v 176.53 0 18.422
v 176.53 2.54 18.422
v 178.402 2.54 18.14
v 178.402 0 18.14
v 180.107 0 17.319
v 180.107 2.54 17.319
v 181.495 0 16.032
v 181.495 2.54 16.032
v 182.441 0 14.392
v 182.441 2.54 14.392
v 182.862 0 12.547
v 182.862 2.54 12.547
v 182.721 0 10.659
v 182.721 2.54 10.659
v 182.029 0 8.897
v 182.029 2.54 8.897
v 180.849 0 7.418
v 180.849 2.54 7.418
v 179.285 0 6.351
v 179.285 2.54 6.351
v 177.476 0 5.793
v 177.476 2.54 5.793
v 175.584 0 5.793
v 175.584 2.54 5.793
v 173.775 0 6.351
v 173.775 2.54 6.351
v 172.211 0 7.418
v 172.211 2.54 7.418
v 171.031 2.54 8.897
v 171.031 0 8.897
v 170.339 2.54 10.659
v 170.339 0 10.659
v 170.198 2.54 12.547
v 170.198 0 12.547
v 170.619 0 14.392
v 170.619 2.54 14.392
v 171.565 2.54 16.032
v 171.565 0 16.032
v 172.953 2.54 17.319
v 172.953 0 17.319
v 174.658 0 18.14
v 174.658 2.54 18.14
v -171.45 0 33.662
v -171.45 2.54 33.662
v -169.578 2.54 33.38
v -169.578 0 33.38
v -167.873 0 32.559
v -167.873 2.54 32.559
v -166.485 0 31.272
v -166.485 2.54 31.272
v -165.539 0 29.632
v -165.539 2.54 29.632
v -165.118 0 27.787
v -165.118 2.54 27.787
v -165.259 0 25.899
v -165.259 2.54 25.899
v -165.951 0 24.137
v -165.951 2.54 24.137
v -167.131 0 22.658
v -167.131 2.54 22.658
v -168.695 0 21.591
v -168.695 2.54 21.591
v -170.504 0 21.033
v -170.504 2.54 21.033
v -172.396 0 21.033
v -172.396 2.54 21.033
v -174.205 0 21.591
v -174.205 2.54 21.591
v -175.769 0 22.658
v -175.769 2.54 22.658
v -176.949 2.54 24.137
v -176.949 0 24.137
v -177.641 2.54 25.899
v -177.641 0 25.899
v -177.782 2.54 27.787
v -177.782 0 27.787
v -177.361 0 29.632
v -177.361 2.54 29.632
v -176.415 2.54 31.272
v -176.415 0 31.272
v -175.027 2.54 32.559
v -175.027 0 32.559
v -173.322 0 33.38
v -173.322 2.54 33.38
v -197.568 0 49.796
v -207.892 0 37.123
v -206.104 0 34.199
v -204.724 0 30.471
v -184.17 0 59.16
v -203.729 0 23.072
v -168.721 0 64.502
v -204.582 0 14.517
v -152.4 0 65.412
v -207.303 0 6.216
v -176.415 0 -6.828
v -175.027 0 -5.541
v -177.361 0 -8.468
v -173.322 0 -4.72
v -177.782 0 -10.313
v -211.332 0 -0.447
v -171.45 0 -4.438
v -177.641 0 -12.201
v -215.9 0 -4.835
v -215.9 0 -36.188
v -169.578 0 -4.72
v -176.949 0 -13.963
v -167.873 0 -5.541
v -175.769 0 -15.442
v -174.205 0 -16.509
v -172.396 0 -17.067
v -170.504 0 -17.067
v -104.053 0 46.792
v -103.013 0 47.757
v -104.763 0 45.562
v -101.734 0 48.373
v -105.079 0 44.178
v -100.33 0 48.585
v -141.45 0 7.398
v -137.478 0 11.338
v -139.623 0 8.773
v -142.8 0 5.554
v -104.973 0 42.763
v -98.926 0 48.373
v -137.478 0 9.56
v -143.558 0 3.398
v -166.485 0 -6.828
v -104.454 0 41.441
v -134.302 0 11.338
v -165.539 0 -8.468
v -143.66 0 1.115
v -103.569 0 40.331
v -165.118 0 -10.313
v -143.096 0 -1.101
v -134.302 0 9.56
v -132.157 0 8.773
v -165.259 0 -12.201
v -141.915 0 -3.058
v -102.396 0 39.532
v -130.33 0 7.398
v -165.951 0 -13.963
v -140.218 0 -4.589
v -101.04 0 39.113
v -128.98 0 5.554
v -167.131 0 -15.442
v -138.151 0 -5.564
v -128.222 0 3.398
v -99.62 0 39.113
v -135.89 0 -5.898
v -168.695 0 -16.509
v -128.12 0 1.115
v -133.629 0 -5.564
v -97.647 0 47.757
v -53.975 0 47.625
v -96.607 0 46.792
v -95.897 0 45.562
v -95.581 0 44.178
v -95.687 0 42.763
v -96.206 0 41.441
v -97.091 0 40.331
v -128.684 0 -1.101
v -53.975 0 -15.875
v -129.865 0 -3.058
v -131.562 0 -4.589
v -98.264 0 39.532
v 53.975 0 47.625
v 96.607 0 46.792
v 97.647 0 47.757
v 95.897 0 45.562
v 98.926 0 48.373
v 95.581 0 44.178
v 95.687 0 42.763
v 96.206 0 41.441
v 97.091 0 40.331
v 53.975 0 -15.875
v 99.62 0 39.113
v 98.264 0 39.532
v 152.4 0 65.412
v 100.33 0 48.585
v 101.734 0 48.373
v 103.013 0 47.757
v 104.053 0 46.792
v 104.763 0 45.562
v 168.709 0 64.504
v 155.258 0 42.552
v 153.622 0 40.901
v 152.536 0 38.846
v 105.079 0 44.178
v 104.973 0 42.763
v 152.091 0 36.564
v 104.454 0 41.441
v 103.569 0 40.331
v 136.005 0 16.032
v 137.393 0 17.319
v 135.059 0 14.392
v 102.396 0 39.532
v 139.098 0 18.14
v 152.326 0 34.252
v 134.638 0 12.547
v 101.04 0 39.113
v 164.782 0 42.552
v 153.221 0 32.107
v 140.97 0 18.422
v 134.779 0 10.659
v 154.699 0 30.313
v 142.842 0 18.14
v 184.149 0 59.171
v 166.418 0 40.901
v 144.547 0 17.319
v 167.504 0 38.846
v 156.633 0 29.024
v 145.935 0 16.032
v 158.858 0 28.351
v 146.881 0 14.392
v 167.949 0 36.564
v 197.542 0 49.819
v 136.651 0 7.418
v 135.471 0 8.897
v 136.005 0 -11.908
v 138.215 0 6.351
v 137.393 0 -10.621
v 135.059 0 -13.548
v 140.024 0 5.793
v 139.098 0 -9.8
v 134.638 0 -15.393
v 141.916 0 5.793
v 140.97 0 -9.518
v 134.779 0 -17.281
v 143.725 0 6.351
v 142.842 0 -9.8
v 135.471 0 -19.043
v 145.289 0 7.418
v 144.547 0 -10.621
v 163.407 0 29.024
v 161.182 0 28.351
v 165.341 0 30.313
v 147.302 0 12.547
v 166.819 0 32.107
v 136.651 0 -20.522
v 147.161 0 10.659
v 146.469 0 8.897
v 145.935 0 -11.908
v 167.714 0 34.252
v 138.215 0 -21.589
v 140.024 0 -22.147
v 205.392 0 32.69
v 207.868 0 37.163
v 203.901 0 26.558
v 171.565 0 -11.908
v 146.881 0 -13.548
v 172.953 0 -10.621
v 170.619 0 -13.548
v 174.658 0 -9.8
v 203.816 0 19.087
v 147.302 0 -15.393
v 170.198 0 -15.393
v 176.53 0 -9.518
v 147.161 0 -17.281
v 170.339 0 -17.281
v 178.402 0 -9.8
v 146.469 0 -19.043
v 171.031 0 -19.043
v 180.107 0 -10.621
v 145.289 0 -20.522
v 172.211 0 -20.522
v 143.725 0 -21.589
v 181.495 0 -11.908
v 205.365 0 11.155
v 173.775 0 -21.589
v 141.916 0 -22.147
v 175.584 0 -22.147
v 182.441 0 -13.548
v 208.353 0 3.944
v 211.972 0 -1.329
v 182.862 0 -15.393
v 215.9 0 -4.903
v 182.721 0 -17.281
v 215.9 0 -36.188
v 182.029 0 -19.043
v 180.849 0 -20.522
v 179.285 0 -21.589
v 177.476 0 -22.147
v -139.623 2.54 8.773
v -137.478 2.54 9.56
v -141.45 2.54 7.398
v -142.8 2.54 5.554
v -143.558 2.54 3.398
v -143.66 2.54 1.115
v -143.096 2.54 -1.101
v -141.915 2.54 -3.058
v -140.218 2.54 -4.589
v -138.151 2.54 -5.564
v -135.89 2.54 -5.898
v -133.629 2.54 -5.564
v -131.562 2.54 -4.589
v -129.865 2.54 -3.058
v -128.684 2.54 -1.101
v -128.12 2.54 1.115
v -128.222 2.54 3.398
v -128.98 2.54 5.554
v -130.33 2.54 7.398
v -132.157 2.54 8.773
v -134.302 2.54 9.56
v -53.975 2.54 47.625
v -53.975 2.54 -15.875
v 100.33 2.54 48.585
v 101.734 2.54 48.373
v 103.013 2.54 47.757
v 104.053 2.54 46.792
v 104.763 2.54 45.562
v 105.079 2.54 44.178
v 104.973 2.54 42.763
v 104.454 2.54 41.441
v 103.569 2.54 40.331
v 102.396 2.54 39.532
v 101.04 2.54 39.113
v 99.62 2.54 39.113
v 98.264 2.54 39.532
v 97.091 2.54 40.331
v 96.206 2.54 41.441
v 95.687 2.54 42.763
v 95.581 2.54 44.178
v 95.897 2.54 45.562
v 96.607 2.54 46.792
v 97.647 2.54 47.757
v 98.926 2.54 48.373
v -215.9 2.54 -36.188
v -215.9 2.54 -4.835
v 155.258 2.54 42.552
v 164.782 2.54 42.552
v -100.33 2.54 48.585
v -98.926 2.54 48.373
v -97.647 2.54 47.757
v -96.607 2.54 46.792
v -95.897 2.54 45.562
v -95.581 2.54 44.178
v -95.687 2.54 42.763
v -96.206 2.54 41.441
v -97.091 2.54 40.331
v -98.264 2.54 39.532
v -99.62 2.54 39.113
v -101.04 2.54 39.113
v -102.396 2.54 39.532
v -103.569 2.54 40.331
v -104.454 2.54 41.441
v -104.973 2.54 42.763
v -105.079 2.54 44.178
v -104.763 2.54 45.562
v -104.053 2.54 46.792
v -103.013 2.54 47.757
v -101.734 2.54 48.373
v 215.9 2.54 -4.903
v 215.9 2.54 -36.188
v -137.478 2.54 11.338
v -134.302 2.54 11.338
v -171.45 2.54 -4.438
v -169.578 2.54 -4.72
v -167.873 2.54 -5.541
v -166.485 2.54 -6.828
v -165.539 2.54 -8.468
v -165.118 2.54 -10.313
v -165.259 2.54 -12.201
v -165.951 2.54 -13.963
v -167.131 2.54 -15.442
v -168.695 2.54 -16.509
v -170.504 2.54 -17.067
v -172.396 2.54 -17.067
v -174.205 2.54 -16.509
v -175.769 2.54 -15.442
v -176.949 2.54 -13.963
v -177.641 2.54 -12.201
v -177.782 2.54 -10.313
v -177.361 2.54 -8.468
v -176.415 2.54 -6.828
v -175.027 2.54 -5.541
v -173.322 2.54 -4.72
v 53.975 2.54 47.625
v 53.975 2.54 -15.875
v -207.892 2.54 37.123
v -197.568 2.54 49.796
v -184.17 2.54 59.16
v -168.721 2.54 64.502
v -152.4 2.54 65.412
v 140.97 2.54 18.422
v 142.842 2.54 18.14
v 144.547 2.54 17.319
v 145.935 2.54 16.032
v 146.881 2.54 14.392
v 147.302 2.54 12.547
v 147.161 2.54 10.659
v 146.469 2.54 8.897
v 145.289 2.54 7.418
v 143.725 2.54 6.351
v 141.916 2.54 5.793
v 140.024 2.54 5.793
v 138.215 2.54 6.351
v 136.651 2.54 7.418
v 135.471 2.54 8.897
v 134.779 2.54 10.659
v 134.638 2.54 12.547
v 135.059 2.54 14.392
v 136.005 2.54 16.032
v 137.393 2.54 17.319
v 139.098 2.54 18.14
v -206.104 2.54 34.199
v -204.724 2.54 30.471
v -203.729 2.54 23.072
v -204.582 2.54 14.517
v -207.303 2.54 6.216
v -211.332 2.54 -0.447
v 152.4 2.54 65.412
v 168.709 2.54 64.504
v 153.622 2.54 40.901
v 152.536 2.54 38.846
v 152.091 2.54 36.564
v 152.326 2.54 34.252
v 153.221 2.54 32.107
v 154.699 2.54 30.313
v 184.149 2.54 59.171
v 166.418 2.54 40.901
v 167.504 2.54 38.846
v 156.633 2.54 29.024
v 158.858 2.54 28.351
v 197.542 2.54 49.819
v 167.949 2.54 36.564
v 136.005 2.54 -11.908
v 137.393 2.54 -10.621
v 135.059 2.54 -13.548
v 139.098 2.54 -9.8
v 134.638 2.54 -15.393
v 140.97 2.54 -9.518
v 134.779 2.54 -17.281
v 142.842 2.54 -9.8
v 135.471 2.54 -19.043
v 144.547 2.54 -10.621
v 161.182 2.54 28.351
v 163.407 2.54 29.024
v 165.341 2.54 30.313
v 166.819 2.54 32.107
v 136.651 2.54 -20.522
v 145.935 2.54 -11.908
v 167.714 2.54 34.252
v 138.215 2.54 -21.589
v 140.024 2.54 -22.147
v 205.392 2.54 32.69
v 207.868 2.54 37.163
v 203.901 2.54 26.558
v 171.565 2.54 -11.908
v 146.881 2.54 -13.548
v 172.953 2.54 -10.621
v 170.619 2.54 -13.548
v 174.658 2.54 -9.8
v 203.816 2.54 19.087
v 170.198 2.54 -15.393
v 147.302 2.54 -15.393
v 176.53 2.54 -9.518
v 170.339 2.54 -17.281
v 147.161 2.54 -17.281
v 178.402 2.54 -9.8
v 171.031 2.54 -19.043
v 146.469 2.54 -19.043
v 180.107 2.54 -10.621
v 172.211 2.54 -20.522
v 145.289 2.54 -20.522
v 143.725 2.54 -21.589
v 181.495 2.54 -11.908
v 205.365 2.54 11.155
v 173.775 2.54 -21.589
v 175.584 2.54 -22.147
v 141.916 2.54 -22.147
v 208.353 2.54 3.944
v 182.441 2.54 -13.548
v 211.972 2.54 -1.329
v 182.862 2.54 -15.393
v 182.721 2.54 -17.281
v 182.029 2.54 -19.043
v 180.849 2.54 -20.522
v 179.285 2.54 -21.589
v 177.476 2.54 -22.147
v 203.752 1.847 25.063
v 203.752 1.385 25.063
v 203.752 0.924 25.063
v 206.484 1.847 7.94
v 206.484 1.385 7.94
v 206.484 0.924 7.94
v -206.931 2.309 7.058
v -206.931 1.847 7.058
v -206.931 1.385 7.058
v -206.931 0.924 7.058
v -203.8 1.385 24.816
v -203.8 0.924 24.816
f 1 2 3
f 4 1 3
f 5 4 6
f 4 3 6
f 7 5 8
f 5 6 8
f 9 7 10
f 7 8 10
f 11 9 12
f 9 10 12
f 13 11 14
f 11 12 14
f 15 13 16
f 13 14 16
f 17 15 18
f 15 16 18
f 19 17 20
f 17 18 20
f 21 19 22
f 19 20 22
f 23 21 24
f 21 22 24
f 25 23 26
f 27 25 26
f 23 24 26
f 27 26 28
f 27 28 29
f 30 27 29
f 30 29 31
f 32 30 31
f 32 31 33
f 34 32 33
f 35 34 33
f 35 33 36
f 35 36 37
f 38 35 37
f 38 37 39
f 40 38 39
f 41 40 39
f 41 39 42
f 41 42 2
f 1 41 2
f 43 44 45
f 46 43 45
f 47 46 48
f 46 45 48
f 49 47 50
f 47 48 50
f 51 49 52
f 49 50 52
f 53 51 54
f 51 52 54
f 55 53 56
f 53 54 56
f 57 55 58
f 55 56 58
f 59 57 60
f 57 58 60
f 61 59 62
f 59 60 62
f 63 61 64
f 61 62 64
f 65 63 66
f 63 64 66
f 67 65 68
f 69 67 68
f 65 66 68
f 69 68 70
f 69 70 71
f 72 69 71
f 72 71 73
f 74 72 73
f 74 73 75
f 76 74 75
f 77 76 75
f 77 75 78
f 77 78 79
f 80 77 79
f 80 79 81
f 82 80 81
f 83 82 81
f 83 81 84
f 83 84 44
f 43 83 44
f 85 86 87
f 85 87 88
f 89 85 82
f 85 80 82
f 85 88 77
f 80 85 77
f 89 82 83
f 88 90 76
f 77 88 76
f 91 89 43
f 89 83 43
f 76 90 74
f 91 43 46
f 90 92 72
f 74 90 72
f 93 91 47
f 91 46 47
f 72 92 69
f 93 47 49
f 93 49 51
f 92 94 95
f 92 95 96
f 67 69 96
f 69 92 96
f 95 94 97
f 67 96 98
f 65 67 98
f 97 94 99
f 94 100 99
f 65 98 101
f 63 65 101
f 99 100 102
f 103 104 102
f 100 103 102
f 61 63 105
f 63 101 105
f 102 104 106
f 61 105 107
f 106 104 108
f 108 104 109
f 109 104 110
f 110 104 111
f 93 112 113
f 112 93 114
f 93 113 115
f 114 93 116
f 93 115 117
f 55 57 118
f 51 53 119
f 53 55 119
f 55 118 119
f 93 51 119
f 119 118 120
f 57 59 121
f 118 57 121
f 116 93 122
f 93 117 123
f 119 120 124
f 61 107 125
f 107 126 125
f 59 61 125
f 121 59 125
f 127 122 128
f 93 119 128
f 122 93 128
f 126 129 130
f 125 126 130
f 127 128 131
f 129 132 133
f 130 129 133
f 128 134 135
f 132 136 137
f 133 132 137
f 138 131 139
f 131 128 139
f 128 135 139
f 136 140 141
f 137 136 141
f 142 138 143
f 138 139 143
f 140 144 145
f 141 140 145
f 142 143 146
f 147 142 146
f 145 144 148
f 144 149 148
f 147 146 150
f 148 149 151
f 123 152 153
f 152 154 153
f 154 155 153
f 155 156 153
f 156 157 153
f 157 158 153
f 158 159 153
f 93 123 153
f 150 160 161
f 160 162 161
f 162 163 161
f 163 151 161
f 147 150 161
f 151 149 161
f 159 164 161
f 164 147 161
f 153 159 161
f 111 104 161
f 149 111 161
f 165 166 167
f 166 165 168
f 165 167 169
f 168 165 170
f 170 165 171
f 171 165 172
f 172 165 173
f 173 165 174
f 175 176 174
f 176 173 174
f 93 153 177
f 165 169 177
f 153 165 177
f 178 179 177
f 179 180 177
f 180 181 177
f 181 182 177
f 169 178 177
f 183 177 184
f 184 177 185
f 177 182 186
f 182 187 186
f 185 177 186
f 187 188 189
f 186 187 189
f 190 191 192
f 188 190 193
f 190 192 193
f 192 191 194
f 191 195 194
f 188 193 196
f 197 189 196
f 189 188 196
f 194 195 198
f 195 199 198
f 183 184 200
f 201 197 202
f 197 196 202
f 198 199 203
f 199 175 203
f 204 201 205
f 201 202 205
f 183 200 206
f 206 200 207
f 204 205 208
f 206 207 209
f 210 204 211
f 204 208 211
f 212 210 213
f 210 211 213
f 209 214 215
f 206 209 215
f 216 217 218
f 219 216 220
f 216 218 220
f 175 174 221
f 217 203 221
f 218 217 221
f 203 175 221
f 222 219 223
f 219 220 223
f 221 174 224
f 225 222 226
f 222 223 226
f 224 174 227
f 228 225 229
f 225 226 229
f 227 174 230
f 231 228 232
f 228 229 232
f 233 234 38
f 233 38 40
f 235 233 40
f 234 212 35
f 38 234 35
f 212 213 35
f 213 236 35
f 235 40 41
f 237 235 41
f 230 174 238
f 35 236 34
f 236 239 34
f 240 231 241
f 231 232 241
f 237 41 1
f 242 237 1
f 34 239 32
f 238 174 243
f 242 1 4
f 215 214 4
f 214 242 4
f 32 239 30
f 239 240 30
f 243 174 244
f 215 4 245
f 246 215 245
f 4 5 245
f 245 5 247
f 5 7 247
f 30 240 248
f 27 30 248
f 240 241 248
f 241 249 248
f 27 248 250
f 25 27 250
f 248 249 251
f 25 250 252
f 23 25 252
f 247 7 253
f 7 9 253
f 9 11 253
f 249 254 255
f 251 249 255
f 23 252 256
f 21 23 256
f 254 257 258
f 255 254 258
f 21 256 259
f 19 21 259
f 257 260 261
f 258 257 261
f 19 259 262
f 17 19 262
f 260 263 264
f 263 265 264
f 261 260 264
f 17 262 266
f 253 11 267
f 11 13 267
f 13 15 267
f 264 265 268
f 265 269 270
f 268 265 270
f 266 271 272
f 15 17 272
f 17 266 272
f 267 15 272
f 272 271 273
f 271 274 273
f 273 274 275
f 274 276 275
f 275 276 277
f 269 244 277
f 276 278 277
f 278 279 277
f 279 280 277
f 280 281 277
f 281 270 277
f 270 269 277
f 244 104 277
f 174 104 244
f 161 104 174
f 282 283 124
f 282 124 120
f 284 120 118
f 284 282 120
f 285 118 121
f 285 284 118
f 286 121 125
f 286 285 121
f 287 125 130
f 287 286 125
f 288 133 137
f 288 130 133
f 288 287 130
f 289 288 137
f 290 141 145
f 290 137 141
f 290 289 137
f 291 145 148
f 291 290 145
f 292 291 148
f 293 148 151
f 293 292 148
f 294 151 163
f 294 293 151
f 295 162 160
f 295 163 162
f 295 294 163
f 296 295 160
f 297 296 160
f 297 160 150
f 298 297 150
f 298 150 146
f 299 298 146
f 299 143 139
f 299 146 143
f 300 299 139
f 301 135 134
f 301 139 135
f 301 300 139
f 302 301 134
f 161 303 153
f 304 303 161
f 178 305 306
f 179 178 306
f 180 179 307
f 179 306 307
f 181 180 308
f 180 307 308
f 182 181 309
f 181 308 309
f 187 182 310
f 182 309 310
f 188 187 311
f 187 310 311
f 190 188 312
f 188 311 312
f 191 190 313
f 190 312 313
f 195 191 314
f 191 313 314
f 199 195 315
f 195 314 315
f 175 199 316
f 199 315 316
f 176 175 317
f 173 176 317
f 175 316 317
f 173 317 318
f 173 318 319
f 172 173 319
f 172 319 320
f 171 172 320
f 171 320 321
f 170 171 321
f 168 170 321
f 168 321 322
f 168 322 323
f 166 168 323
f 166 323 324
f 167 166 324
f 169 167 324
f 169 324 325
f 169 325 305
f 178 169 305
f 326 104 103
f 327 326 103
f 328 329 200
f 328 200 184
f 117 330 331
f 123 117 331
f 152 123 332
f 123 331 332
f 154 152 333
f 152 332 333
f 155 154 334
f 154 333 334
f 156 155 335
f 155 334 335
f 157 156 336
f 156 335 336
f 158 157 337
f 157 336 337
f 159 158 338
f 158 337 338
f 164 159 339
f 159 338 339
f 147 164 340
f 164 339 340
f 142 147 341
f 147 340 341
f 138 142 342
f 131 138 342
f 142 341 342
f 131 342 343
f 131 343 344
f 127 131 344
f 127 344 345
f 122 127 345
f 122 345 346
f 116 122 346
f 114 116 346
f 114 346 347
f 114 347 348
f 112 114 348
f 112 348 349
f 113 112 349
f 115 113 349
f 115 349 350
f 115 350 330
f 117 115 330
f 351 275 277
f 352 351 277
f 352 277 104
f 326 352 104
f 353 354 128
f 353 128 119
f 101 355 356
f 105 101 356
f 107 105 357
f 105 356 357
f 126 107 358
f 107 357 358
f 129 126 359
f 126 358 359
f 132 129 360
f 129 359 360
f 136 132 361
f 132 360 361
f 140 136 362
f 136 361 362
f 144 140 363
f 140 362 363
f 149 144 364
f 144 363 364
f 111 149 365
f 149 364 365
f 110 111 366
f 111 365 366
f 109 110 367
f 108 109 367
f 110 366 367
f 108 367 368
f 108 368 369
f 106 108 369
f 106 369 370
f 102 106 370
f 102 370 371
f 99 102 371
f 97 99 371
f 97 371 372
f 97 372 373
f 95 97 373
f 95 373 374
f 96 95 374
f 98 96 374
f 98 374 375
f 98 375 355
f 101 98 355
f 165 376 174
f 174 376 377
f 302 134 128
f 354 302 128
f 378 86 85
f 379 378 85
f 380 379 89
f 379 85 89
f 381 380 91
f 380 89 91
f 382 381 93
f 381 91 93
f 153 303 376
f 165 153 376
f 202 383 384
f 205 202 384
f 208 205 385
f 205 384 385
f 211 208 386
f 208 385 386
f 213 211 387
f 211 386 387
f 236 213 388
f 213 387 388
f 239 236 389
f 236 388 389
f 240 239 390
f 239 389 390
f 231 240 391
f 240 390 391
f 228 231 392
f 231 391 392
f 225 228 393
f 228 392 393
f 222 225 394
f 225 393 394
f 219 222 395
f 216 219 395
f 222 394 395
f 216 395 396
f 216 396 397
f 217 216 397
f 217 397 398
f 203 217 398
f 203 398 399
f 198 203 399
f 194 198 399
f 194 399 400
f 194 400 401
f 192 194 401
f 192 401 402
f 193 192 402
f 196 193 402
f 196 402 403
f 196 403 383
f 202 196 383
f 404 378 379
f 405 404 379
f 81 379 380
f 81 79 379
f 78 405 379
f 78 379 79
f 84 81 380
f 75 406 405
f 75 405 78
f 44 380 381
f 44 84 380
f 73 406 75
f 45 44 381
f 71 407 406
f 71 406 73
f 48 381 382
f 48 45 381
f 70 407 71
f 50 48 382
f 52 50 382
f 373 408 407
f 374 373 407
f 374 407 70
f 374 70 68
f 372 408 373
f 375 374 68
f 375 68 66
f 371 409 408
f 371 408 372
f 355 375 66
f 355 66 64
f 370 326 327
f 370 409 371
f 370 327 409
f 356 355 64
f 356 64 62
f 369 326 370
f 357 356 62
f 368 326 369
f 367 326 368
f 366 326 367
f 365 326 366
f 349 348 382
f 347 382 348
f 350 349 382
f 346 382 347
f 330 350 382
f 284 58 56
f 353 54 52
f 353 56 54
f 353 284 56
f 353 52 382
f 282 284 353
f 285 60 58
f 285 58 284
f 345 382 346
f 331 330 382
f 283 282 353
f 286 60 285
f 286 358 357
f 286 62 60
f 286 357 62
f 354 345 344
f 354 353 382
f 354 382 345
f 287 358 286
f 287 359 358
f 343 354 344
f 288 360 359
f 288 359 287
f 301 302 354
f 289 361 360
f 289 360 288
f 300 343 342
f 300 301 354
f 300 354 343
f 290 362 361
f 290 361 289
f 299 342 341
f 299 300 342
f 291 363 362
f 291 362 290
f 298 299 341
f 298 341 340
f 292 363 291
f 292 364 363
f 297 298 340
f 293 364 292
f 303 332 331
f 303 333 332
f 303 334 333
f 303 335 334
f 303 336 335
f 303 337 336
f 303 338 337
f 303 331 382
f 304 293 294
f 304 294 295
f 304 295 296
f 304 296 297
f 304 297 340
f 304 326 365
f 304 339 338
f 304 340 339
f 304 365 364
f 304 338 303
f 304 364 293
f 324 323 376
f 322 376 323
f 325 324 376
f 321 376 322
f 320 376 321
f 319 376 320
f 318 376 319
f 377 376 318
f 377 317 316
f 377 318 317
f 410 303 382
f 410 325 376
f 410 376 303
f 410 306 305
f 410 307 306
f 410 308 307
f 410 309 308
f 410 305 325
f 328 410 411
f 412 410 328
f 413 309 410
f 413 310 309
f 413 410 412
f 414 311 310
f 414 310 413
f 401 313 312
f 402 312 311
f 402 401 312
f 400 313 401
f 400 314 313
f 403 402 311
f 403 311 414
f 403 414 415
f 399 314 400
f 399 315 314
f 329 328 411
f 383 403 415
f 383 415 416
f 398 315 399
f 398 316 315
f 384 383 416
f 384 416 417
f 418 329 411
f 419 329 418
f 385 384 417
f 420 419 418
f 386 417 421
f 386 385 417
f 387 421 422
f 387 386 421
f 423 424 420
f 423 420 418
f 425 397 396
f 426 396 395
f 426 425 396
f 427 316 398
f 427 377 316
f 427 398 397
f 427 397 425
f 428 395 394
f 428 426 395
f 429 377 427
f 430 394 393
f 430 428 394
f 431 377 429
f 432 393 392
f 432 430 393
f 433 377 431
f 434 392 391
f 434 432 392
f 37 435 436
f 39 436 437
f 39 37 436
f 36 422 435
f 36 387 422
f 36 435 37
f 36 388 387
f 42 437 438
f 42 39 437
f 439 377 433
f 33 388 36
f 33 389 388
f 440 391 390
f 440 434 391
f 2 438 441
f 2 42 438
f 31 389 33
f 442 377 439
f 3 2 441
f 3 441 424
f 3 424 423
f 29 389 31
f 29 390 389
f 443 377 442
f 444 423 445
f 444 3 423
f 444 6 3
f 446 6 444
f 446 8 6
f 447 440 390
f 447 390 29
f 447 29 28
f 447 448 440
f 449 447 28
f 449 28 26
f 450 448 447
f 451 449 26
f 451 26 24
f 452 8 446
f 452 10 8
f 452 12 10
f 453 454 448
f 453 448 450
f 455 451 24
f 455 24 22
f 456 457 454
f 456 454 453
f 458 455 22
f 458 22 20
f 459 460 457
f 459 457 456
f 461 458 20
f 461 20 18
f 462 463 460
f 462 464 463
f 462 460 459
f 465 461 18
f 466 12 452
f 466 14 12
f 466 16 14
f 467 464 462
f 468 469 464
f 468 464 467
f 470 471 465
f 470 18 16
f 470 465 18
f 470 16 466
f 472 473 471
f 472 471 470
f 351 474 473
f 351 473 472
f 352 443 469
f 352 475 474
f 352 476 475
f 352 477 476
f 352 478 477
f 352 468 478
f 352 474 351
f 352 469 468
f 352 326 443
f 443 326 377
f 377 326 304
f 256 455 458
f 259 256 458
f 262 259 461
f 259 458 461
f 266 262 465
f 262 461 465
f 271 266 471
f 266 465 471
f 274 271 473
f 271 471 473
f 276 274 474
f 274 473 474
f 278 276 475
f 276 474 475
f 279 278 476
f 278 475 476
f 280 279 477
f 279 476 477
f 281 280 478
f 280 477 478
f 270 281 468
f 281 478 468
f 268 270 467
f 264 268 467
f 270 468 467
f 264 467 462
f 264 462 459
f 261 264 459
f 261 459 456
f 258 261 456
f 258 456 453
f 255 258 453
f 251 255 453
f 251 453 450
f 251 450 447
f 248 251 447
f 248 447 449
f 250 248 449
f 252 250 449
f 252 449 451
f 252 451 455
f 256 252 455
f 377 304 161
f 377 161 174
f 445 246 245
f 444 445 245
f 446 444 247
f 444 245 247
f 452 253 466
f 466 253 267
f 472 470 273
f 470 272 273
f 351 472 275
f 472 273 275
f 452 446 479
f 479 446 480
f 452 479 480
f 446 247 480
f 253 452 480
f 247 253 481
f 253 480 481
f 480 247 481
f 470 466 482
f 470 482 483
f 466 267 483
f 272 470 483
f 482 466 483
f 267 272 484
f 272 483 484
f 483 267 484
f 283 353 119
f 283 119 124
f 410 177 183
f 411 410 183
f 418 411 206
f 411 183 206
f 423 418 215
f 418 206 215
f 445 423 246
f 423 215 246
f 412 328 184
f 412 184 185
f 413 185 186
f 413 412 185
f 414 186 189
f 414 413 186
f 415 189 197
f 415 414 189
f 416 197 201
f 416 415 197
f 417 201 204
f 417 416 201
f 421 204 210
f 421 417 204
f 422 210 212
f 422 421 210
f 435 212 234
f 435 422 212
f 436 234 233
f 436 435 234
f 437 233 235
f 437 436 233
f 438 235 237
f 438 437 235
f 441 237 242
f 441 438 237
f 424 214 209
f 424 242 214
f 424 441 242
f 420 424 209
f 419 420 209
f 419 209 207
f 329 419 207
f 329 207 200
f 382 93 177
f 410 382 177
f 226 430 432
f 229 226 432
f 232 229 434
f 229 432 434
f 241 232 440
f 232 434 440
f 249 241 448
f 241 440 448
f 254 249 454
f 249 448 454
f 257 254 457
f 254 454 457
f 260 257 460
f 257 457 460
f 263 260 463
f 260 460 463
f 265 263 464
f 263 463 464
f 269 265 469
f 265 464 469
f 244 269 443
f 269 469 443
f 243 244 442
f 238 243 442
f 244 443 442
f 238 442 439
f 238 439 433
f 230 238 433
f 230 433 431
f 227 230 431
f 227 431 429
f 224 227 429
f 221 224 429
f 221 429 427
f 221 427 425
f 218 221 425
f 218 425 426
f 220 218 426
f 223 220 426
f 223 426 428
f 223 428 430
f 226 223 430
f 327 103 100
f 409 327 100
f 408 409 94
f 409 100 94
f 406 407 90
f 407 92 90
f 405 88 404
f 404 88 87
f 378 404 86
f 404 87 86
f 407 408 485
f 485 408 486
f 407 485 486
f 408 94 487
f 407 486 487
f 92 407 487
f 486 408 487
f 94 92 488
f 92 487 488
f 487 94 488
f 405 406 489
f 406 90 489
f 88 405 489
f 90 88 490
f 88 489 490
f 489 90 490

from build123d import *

# Parameters (mm, degrees)
BOSS_EXTRUDE1_DEPTH = 2.54
SKETCH2_W           = 107.95
SKETCH2_H           = 63.5
CUT_EXTRUDE1_DEPTH  = 226.664855764
CUT_EXTRUDE2_START  = -2.54
CUT_EXTRUDE2_DEPTH  = 2.54
SKETCH4_R           = 4.7625
SKETCH4_R_2         = 6.35
CUT_EXTRUDE3_DEPTH  = 226.66485589


# Read off the part's stored shape, not the designer's step: Cut-Extrude2
with BuildPart() as part:
    # Sketch1 → Boss-Extrude1 (new body)
    with BuildSketch(Plane(origin=(0, 0, 0), x_dir=(1, 0, 0), z_dir=(0, 1, 0))):
        with BuildLine():
            Line((215.9, -14.612459999), (215.9, 36.187540001))
            Line((215.9, 36.187540001), (-215.9, 36.187540001))
            Line((-215.9, 36.187540001), (-215.9, -14.612459999))
            ThreePointArc((-215.9, -14.612459999), (-194.259204241, -52.648965299), (-152.4, -65.412459999))
            Line((-152.4, -65.412459999), (152.4, -65.412459999))
            ThreePointArc((152.4, -65.412459999), (194.259204241, -52.648965299), (215.9, -14.612459999))
        make_face()
    extrude(amount=BOSS_EXTRUDE1_DEPTH)

    # Sketch2 → Cut-Extrude1 (cut, through all)
    with BuildSketch(Plane(origin=(0, 2.54, 0), x_dir=(1, 0, 0), z_dir=(0, 1, 0))):
        with Locations((0, -15.875)):
            Rectangle(SKETCH2_W, SKETCH2_H)
    extrude(amount=-CUT_EXTRUDE1_DEPTH, mode=Mode.SUBTRACT)

    # Cut-Extrude2 outline → Cut-Extrude2 (cut)
    with BuildSketch(Plane(origin=(0, 2.54, 0), x_dir=(1, 0, 0), z_dir=(0, 1, 0)).offset(CUT_EXTRUDE2_START)):
        with BuildLine():
            add(Edge.make_bspline(
                [(-215.899999994, 4.835115527), (-215.566109371, 4.600913161), (-214.20332449, 3.575815014), (-211.81883724, 1.254885046), (-208.930212321, -2.798021616), (-206.463783195, -7.807066224), (-204.667192604, -13.474398824), (-203.719076257, -19.343595697), (-203.665482888, -24.926688771), (-204.419435916, -29.846217321), (-205.817811739, -33.905445303), (-207.110427717, -36.090029013), (-207.840384867, -37.055481676), (-207.892164085, -37.122761751)],
                knots=[0.114839475, 0.114839475, 0.114839475, 0.114839475, 0.125, 0.15625, 0.1875, 0.21875, 0.25, 0.28125, 0.3125, 0.34375, 0.375, 0.40625, 0.408621758, 0.408621758, 0.408621758, 0.408621758], degree=3))
            Line((-215.899999994, 4.835115527), (-215.9, -14.612459999))
            ThreePointArc((-215.9, -14.612459999), (-213.044051445, -26.27599059), (-207.892164085, -37.122761751))
        make_face()
        with BuildLine():
            add(Edge.make_bspline(
                [(207.868044886, -37.162504966), (207.809793398, -37.087410994), (207.071460176, -36.116522204), (205.76942942, -33.924763186), (204.364219868, -29.86852613), (203.602011314, -24.951147017), (203.646262202, -19.369088999), (204.584578872, -13.499601085), (206.371728131, -7.830613162), (208.829838854, -2.818725142), (211.711764265, 1.237884913), (214.130027538, 3.598772476), (215.528958726, 4.645764848), (215.899999994, 4.902596054)],
                knots=[0.09109108, 0.09109108, 0.09109108, 0.09109108, 0.09375, 0.125, 0.15625, 0.1875, 0.21875, 0.25, 0.28125, 0.3125, 0.34375, 0.375, 0.386307936, 0.386307936, 0.386307936, 0.386307936], degree=3))
            ThreePointArc((207.868044886, -37.162504966), (213.03625635, -26.297889248), (215.9, -14.612459999))
            Line((215.9, -14.612459999), (215.899999994, 4.902596054))
        make_face()
    extrude(amount=CUT_EXTRUDE2_DEPTH, mode=Mode.SUBTRACT)

    # Sketch4 → Cut-Extrude3 (cut, through all)
    with BuildSketch(Plane(origin=(0, 2.54, 0), x_dir=(1, 0, 0), z_dir=(0, 1, 0))):
        with Locations(Location((100.33, -43.822459999, 0), (0, 0, 270))):
            Circle(SKETCH4_R)
        with Locations(Location((140.97, -12.072459999, 0), (0, 0, 270))):
            Circle(SKETCH4_R_2)
        with Locations(Location((140.97, 15.867540001, 0), (0, 0, 270))):
            Circle(SKETCH4_R_2)
        with Locations(Location((176.53, 15.867540001, 0), (0, 0, 270))):
            Circle(SKETCH4_R_2)
        with Locations(Location((-100.33, -43.822459999, 0), (0, 0, 270))):
            Circle(SKETCH4_R)
        with Locations(Location((-171.45, -27.312459999, 0), (0, 0, 270))):
            Circle(SKETCH4_R_2)
        with Locations(Location((-171.45, 10.787540001, 0), (0, 0, 270))):
            Circle(SKETCH4_R_2)
        with Locations(Location((176.53, -12.072459999, 0), (0, 0, 270))):
            Circle(SKETCH4_R_2)
        with BuildLine():
            Line((164.7825, -42.552459999), (155.2575, -42.552459999))
            ThreePointArc((155.2575, -42.552459999), (160.02, -28.264959999), (164.7825, -42.552459999))
        make_face()
        with BuildLine():
            Line((-134.3025, -9.559927161), (-134.3025, -11.337927161))
            Line((-134.3025, -11.337927161), (-137.4775, -11.337927161))
            Line((-137.4775, -11.337927161), (-137.4775, -9.559927161))
            ThreePointArc((-137.4775, -9.559927161), (-135.89, 5.898040001), (-134.3025, -9.559927161))
        make_face()
    extrude(amount=-CUT_EXTRUDE3_DEPTH, mode=Mode.SUBTRACT)


solid = part.part
